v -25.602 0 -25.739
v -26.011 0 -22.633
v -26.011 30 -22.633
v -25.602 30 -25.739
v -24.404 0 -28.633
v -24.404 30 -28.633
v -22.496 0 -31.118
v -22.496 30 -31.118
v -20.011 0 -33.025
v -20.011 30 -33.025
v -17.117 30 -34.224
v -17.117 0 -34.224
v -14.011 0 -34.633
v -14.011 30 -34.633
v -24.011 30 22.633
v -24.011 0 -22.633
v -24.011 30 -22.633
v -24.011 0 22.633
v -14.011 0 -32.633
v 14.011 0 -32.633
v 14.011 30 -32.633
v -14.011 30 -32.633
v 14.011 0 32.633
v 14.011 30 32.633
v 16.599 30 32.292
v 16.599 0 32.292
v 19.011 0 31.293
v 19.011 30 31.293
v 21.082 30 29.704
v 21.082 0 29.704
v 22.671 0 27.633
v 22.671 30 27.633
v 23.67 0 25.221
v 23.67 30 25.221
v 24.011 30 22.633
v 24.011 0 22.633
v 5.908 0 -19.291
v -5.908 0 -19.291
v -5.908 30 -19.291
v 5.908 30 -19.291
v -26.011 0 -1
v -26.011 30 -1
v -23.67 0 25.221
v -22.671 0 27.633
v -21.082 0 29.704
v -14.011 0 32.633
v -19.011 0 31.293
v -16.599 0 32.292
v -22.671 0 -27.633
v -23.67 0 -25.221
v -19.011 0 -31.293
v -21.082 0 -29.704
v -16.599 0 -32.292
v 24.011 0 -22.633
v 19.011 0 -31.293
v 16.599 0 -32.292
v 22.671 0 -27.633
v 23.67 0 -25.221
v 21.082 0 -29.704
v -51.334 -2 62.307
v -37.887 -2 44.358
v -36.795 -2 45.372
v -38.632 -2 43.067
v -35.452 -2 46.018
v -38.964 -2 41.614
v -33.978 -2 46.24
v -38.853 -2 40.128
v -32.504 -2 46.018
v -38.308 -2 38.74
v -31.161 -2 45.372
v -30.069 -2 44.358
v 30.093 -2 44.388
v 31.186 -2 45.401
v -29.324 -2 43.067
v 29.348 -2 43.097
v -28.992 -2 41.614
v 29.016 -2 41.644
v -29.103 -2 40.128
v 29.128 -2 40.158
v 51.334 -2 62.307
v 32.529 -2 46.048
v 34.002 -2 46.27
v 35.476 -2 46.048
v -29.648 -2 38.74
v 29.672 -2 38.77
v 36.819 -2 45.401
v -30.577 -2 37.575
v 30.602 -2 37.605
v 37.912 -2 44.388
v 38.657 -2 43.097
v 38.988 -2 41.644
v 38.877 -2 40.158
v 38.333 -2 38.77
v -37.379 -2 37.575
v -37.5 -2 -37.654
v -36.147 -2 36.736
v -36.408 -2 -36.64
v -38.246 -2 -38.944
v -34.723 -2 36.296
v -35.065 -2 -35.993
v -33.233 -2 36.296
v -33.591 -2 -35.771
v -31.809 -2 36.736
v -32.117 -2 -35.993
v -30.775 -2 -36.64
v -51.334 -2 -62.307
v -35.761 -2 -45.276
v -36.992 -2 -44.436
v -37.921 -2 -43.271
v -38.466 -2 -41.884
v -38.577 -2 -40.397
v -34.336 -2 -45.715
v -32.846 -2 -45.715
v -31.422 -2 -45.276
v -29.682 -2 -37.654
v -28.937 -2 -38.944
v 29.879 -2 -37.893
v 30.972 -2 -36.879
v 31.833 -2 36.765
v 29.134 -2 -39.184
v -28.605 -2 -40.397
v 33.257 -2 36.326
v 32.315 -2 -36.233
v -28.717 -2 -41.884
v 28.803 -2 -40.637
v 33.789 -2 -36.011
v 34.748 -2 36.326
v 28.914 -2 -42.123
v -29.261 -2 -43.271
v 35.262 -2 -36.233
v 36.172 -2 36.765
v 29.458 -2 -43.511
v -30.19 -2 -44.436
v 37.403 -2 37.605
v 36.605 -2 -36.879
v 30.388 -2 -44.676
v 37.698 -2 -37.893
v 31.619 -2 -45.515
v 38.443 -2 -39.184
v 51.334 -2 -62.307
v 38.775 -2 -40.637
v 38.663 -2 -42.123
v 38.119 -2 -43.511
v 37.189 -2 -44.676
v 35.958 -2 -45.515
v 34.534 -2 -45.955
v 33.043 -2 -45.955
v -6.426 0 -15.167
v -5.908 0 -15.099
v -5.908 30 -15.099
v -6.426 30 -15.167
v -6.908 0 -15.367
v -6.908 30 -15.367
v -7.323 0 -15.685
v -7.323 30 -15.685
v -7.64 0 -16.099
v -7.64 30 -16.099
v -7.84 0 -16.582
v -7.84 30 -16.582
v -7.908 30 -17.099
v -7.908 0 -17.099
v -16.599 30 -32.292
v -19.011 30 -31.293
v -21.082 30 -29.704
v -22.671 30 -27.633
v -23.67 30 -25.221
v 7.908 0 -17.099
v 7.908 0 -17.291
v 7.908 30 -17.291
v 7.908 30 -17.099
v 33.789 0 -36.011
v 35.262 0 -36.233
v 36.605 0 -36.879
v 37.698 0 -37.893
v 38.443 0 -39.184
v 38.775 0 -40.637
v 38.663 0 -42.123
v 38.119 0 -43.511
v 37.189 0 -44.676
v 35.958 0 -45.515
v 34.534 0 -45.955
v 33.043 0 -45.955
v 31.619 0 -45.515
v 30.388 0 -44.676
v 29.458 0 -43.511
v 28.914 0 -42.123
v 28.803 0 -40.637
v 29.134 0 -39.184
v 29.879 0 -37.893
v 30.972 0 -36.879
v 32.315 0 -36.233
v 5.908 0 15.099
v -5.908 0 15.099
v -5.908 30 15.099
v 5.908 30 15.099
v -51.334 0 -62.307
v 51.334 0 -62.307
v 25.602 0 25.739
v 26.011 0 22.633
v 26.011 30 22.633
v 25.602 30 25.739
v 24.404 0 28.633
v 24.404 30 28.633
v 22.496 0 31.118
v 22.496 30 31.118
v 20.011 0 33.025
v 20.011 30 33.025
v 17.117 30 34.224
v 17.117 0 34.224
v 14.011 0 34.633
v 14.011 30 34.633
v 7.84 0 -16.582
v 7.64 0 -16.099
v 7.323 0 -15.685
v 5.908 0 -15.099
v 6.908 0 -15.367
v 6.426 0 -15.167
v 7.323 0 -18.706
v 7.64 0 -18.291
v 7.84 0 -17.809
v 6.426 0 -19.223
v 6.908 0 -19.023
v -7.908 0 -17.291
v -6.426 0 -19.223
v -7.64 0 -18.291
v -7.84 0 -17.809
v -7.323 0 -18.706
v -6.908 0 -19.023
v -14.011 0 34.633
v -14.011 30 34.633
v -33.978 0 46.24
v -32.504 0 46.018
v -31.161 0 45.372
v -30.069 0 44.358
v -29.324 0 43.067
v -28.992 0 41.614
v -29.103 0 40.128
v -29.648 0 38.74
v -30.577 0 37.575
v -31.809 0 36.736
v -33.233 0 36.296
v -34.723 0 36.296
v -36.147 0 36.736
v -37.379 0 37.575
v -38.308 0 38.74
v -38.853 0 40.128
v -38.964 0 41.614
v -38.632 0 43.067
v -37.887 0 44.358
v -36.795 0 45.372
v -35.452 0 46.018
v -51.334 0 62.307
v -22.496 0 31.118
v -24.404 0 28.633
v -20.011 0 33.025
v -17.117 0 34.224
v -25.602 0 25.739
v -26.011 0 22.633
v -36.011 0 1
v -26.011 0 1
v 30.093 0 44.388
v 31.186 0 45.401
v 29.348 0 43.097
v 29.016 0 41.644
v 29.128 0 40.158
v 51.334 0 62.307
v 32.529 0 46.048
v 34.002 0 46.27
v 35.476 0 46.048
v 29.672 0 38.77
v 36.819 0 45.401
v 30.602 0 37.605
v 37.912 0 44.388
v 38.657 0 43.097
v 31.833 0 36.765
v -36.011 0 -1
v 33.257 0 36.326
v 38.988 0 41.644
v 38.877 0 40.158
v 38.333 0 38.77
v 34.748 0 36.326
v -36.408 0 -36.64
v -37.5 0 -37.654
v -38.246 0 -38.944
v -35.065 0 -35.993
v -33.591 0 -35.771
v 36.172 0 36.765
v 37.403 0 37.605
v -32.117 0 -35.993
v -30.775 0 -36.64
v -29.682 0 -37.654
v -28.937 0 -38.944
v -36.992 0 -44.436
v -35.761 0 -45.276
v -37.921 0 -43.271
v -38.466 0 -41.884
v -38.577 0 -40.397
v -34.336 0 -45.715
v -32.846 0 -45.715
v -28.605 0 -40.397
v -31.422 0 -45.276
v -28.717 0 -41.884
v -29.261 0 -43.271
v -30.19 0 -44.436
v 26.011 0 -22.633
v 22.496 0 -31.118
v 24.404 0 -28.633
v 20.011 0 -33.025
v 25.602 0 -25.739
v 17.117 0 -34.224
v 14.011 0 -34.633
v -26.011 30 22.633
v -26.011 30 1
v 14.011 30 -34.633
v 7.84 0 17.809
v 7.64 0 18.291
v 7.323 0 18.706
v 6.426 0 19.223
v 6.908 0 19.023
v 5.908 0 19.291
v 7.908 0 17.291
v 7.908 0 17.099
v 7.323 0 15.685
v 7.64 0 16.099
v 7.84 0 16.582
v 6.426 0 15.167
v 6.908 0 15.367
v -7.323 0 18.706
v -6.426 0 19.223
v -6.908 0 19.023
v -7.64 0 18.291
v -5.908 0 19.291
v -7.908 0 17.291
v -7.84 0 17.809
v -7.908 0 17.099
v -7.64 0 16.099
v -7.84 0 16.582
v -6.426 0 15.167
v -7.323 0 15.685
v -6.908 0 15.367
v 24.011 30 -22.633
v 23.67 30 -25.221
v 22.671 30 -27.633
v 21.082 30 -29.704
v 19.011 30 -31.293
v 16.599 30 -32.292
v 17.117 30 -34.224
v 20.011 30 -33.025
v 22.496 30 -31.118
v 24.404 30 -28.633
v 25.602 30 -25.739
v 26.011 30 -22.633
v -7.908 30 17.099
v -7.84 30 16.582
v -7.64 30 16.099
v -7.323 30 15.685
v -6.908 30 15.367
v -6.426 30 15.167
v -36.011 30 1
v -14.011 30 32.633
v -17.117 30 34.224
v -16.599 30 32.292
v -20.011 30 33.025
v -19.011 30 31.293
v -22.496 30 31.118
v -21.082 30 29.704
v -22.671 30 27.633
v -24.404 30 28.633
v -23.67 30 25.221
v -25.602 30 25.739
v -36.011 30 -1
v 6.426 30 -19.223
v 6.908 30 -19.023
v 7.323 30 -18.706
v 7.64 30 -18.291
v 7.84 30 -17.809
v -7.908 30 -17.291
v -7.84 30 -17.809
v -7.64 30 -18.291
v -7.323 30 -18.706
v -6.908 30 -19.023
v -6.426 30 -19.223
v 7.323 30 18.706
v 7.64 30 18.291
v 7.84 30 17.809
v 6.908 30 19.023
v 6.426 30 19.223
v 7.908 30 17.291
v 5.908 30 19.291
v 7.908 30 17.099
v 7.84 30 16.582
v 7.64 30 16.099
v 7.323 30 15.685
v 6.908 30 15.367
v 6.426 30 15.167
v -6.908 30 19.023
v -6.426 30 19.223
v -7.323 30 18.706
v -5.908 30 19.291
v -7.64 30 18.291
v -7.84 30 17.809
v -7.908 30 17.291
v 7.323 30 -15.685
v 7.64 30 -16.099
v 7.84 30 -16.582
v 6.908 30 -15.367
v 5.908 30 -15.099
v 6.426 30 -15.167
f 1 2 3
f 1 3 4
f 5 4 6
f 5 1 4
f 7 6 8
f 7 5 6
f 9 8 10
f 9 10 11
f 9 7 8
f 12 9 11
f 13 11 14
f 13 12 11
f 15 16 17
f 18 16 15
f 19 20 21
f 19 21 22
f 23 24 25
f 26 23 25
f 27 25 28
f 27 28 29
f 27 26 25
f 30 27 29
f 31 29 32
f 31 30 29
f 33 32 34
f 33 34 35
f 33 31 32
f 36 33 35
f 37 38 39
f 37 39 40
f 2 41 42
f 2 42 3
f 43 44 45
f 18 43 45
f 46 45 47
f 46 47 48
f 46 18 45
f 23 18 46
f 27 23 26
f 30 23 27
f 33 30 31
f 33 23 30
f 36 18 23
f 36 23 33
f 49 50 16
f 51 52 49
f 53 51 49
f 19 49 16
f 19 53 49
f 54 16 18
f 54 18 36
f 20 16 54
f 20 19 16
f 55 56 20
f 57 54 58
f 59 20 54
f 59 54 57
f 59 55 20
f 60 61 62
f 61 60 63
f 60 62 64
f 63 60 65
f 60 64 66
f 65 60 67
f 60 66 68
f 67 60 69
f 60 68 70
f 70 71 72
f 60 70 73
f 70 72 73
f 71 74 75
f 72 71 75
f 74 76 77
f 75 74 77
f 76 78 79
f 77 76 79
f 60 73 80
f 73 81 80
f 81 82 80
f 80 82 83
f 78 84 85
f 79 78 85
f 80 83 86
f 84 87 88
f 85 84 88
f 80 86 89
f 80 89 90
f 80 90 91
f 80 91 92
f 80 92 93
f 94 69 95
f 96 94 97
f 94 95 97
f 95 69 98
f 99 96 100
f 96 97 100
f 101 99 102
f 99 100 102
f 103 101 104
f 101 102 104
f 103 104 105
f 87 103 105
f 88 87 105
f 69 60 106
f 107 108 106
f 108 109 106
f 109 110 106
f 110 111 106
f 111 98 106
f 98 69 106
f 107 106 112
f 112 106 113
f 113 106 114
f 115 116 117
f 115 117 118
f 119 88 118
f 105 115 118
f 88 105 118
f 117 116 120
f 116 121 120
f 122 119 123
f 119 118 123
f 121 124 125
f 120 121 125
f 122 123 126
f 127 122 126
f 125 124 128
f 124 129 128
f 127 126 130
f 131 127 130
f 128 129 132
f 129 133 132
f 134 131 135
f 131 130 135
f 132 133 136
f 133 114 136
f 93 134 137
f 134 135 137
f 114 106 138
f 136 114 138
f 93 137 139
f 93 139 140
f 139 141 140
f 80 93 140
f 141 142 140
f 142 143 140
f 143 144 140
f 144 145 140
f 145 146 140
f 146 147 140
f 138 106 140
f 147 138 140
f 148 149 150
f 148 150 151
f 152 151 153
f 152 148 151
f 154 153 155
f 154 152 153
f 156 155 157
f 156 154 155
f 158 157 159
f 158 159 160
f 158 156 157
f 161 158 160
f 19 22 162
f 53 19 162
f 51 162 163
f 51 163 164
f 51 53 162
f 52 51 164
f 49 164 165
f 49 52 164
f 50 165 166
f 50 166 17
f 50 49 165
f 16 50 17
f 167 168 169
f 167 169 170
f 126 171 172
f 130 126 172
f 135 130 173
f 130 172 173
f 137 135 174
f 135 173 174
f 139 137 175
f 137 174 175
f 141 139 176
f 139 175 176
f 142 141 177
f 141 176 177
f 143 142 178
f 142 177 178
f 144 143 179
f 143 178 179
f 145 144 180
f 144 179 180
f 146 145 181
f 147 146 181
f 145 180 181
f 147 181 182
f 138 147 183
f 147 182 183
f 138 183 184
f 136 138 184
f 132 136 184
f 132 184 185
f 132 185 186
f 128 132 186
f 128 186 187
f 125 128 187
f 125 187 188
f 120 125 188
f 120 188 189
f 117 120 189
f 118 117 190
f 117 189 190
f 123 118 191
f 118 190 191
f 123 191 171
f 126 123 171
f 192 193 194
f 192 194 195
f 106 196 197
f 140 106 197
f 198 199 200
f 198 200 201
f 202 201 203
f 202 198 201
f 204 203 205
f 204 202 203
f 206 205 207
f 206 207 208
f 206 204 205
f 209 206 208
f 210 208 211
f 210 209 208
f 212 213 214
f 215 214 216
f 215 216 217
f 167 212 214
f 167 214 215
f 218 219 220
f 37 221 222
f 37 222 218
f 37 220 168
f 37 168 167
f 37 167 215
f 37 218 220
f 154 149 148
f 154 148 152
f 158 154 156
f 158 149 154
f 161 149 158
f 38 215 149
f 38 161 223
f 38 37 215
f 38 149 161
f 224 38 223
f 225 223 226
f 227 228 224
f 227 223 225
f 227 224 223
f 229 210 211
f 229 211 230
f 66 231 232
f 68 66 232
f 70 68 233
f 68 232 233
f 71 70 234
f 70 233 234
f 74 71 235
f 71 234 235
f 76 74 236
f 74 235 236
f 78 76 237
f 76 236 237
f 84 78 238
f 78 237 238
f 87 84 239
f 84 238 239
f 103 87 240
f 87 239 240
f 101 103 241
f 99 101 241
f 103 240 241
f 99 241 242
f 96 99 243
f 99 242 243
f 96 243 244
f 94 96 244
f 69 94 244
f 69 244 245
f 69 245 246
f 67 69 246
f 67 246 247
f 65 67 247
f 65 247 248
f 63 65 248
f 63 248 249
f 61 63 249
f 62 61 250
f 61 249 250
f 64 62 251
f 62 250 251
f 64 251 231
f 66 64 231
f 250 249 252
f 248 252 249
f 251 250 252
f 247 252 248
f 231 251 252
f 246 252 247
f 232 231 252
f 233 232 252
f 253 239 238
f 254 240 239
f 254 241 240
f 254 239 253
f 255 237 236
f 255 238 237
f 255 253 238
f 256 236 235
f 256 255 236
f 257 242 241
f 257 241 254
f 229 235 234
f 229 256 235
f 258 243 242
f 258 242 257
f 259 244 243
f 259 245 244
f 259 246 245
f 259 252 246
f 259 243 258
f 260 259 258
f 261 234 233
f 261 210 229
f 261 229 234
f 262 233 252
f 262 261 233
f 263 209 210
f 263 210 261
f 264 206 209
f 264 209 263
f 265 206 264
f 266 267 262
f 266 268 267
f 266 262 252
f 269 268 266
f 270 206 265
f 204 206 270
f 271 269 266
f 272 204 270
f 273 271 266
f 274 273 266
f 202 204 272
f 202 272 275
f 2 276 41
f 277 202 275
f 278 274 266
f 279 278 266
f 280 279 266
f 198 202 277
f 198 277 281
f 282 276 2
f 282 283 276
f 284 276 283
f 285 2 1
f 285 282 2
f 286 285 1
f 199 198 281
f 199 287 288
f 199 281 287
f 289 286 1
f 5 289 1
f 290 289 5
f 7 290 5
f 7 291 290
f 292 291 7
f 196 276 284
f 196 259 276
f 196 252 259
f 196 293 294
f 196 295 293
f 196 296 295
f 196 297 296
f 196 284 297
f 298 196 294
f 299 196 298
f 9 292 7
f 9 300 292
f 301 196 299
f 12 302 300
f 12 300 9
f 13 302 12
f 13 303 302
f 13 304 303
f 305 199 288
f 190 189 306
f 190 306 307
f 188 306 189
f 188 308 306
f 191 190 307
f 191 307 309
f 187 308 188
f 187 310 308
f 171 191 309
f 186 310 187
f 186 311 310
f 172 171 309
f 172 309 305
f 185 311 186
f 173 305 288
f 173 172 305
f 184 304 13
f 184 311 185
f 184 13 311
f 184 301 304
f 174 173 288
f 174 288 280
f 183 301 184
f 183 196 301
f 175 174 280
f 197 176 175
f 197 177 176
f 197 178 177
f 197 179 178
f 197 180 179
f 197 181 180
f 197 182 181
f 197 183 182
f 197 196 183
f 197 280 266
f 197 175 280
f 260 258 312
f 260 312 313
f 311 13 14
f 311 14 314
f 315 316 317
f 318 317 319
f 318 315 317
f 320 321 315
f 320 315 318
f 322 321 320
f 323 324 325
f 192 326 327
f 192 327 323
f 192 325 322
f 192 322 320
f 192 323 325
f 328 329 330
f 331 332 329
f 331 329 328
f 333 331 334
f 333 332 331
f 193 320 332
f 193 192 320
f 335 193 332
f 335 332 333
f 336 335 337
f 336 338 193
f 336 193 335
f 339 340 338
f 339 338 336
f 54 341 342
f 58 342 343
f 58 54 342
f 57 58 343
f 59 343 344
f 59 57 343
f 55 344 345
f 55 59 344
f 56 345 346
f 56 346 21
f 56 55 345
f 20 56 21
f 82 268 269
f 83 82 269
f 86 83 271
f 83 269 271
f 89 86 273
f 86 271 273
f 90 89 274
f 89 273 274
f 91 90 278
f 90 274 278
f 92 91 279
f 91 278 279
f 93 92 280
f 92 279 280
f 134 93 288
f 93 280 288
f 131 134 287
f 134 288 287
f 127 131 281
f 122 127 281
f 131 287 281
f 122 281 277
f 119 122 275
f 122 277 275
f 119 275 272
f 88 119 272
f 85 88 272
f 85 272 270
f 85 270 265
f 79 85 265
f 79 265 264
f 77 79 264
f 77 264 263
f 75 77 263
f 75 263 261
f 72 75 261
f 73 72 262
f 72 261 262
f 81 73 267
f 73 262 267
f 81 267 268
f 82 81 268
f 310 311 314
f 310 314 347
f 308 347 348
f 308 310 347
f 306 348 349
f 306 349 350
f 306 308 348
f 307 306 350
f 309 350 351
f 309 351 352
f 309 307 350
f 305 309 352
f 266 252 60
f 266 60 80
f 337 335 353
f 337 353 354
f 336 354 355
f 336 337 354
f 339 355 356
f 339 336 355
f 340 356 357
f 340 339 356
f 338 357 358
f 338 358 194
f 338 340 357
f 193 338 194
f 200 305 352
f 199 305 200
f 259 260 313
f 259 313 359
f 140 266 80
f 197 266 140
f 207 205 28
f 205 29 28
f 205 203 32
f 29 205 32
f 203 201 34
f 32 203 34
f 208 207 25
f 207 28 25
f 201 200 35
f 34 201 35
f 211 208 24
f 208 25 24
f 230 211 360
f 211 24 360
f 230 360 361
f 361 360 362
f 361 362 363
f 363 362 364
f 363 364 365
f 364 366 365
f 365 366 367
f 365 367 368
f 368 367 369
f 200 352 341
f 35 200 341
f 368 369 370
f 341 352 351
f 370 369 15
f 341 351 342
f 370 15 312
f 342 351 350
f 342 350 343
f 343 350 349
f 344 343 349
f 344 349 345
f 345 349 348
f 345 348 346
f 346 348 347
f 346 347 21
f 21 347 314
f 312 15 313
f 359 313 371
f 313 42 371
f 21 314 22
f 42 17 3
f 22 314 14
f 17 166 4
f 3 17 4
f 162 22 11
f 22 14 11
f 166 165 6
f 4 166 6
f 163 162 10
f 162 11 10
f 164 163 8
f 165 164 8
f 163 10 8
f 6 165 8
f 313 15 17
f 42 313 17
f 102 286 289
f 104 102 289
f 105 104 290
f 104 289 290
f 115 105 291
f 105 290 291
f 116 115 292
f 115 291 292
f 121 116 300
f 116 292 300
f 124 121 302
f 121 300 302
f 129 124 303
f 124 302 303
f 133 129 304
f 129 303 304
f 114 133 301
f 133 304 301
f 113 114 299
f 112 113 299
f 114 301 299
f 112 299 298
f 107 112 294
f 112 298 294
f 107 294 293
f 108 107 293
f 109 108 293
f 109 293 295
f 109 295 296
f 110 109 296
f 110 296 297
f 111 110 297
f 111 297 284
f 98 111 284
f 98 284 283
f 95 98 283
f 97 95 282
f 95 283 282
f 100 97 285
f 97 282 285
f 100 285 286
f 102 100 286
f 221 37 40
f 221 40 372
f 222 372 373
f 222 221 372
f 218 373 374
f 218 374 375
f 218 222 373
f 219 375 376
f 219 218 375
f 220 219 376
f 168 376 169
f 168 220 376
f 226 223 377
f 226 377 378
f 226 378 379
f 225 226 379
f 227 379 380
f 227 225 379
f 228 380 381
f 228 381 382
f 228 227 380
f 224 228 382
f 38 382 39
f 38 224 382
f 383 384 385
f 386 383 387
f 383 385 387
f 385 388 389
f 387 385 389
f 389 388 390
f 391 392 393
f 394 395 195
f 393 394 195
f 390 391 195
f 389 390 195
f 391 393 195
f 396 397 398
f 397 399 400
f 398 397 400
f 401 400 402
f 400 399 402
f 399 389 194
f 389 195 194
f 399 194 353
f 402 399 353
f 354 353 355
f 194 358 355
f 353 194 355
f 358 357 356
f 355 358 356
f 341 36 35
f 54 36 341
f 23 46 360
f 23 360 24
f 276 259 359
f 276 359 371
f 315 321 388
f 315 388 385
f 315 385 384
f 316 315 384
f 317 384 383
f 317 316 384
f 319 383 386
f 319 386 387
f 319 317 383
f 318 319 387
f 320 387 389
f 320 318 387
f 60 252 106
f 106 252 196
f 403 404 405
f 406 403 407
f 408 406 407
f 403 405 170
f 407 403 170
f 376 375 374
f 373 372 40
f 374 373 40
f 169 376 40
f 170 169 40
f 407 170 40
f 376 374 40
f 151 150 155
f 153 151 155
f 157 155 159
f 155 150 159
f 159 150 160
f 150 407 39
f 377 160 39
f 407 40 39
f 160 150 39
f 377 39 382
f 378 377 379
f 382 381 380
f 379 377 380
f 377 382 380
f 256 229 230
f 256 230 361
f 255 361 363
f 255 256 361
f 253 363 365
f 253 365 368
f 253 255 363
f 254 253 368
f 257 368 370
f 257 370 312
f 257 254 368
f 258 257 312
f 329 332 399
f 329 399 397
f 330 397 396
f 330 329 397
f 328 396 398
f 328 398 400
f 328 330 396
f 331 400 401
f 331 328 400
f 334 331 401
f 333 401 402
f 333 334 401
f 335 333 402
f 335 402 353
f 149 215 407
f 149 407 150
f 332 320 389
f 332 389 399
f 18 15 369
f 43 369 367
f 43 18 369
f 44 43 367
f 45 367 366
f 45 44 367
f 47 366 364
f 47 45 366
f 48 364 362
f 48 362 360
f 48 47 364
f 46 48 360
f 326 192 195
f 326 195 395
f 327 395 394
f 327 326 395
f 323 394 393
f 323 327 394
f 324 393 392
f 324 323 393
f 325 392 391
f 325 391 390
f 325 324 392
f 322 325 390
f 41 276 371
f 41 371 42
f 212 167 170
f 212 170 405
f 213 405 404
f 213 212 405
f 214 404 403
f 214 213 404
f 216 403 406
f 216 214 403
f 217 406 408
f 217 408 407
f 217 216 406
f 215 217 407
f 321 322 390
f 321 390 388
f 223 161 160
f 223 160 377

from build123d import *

# Parameters (mm, degrees)
EXTRUDE_1_DEPTH   = 30
EXTRUDE_1_2_DEPTH = 30
EXTRUDE_1_3_DEPTH = 30
SKETCH_2_W        = 102.668849522
SKETCH_2_H        = 124.613288396
SKETCH_2_R        = 5
EXTRUDE_2_DEPTH   = 2


with BuildPart() as part:
    # 草图1 → 凸台-拉伸1 (new body)
    with BuildSketch(Plane(origin=(0, 0, 0), x_dir=(1, 0, 0), z_dir=(0, 1, 0))):
        with BuildLine():
            ThreePointArc((-26.011198321, 22.633142138), (-22.496479695, 31.118423512), (-14.011198321, 34.633142138))
            Line((-14.011198321, 34.633142138), (14.011198321, 34.633142138))
            ThreePointArc((14.011198321, 34.633142138), (22.496479695, 31.118423512), (26.011198321, 22.633142138))
            Line((26.011198321, 22.633142138), (26.011198321, -22.633142138))
            ThreePointArc((26.011198321, -22.633142138), (22.496479695, -31.118423512), (14.011198321, -34.633142138))
            Line((14.011198321, -34.633142138), (-14.011198321, -34.633142138))
            ThreePointArc((-14.011198321, -34.633142138), (-22.496479695, -31.118423512), (-26.011198321, -22.633142138))
            Line((-26.011198321, -22.633142138), (-26.011198321, -1))
            Line((-26.011198321, -1), (-36.011198321, -1))
            Line((-36.011198321, -1), (-36.011198321, 1))
            Line((-36.011198321, 1), (-26.011198321, 1))
            Line((-26.011198321, 1), (-26.011198321, 22.633142138))
        make_face()
        with BuildLine():
            Line((-24.011198321, 22.633142138), (-24.011198321, -22.633142138))
            ThreePointArc((-24.011198321, -22.633142138), (-21.082266133, -29.70420995), (-14.011198321, -32.633142138))
            Line((-14.011198321, -32.633142138), (14.011198321, -32.633142138))
            ThreePointArc((14.011198321, -32.633142138), (21.082266133, -29.70420995), (24.011198321, -22.633142138))
            Line((24.011198321, -22.633142138), (24.011198321, 22.633142138))
            ThreePointArc((24.011198321, 22.633142138), (21.082266133, 29.70420995), (14.011198321, 32.633142138))
            Line((14.011198321, 32.633142138), (-14.011198321, 32.633142138))
            ThreePointArc((-14.011198321, 32.633142138), (-21.082266133, 29.70420995), (-24.011198321, 22.633142138))
        make_face(mode=Mode.SUBTRACT)
    extrude(amount=EXTRUDE_1_DEPTH)

    # 草图2 → 凸台-拉伸2 (add)
    with BuildSketch(Plane(origin=(0, 0, 0), x_dir=(1, 0, 0), z_dir=(0, 1, 0))):
        Rectangle(SKETCH_2_W, SKETCH_2_H)
        with Locations(Location((-33.977994318, -41.240450485, 0), (0, 0, 270))):
            Circle(SKETCH_2_R, mode=Mode.SUBTRACT)
        with Locations(Location((34.002429765, -41.270108764, 0), (0, 0, 270))):
            Circle(SKETCH_2_R, mode=Mode.SUBTRACT)
        with Locations(Location((33.788584472, 41.01055618, 0), (0, 0, 270))):
            Circle(SKETCH_2_R, mode=Mode.SUBTRACT)
        with Locations(Location((-33.591248628, 40.771041775, 0), (0, 0, 270))):
            Circle(SKETCH_2_R, mode=Mode.SUBTRACT)
    extrude(amount=-EXTRUDE_2_DEPTH)


with BuildPart() as body_2:
    # 草图1 → Extrude 1 2 (new body)
    with BuildSketch(Plane(origin=(0, 0, 0), x_dir=(1, 0, 0), z_dir=(0, 1, 0))):
        with BuildLine():
            ThreePointArc((5.908394367, 19.291424928), (7.322607929, 18.705638491), (7.908394367, 17.291424928))
            Line((7.908394367, 17.291424928), (7.908394367, 17.099147011))
            ThreePointArc((7.908394367, 17.099147011), (7.322607929, 15.684933449), (5.908394367, 15.099147011))
            Line((5.908394367, 15.099147011), (-5.908394367, 15.099147011))
            ThreePointArc((-5.908394367, 15.099147011), (-7.322607929, 15.684933449), (-7.908394367, 17.099147011))
            Line((-7.908394367, 17.099147011), (-7.908394367, 17.291424928))
            ThreePointArc((-7.908394367, 17.291424928), (-7.322607929, 18.705638491), (-5.908394367, 19.291424928))
            Line((-5.908394367, 19.291424928), (5.908394367, 19.291424928))
        make_face()
    extrude(amount=EXTRUDE_1_2_DEPTH)


with BuildPart() as body_3:
    # 草图1 → Extrude 1 3 (new body)
    with BuildSketch(Plane(origin=(0, 0, 0), x_dir=(1, 0, 0), z_dir=(0, 1, 0))):
        with BuildLine():
            Line((-7.908394367, -17.291424928), (-7.908394367, -17.099147011))
            ThreePointArc((-7.908394367, -17.099147011), (-7.322607929, -15.684933449), (-5.908394367, -15.099147011))
            Line((-5.908394367, -15.099147011), (5.908394367, -15.099147011))
            ThreePointArc((5.908394367, -15.099147011), (7.322607929, -15.684933449), (7.908394367, -17.099147011))
            Line((7.908394367, -17.099147011), (7.908394367, -17.291424928))
            ThreePointArc((7.908394367, -17.291424928), (7.322607929, -18.705638491), (5.908394367, -19.291424928))
            Line((5.908394367, -19.291424928), (-5.908394367, -19.291424928))
            ThreePointArc((-5.908394367, -19.291424928), (-7.322607929, -18.705638491), (-7.908394367, -17.291424928))
        make_face()
    extrude(amount=EXTRUDE_1_3_DEPTH)


solid = Compound([part.part, body_2.part, body_3.part])
